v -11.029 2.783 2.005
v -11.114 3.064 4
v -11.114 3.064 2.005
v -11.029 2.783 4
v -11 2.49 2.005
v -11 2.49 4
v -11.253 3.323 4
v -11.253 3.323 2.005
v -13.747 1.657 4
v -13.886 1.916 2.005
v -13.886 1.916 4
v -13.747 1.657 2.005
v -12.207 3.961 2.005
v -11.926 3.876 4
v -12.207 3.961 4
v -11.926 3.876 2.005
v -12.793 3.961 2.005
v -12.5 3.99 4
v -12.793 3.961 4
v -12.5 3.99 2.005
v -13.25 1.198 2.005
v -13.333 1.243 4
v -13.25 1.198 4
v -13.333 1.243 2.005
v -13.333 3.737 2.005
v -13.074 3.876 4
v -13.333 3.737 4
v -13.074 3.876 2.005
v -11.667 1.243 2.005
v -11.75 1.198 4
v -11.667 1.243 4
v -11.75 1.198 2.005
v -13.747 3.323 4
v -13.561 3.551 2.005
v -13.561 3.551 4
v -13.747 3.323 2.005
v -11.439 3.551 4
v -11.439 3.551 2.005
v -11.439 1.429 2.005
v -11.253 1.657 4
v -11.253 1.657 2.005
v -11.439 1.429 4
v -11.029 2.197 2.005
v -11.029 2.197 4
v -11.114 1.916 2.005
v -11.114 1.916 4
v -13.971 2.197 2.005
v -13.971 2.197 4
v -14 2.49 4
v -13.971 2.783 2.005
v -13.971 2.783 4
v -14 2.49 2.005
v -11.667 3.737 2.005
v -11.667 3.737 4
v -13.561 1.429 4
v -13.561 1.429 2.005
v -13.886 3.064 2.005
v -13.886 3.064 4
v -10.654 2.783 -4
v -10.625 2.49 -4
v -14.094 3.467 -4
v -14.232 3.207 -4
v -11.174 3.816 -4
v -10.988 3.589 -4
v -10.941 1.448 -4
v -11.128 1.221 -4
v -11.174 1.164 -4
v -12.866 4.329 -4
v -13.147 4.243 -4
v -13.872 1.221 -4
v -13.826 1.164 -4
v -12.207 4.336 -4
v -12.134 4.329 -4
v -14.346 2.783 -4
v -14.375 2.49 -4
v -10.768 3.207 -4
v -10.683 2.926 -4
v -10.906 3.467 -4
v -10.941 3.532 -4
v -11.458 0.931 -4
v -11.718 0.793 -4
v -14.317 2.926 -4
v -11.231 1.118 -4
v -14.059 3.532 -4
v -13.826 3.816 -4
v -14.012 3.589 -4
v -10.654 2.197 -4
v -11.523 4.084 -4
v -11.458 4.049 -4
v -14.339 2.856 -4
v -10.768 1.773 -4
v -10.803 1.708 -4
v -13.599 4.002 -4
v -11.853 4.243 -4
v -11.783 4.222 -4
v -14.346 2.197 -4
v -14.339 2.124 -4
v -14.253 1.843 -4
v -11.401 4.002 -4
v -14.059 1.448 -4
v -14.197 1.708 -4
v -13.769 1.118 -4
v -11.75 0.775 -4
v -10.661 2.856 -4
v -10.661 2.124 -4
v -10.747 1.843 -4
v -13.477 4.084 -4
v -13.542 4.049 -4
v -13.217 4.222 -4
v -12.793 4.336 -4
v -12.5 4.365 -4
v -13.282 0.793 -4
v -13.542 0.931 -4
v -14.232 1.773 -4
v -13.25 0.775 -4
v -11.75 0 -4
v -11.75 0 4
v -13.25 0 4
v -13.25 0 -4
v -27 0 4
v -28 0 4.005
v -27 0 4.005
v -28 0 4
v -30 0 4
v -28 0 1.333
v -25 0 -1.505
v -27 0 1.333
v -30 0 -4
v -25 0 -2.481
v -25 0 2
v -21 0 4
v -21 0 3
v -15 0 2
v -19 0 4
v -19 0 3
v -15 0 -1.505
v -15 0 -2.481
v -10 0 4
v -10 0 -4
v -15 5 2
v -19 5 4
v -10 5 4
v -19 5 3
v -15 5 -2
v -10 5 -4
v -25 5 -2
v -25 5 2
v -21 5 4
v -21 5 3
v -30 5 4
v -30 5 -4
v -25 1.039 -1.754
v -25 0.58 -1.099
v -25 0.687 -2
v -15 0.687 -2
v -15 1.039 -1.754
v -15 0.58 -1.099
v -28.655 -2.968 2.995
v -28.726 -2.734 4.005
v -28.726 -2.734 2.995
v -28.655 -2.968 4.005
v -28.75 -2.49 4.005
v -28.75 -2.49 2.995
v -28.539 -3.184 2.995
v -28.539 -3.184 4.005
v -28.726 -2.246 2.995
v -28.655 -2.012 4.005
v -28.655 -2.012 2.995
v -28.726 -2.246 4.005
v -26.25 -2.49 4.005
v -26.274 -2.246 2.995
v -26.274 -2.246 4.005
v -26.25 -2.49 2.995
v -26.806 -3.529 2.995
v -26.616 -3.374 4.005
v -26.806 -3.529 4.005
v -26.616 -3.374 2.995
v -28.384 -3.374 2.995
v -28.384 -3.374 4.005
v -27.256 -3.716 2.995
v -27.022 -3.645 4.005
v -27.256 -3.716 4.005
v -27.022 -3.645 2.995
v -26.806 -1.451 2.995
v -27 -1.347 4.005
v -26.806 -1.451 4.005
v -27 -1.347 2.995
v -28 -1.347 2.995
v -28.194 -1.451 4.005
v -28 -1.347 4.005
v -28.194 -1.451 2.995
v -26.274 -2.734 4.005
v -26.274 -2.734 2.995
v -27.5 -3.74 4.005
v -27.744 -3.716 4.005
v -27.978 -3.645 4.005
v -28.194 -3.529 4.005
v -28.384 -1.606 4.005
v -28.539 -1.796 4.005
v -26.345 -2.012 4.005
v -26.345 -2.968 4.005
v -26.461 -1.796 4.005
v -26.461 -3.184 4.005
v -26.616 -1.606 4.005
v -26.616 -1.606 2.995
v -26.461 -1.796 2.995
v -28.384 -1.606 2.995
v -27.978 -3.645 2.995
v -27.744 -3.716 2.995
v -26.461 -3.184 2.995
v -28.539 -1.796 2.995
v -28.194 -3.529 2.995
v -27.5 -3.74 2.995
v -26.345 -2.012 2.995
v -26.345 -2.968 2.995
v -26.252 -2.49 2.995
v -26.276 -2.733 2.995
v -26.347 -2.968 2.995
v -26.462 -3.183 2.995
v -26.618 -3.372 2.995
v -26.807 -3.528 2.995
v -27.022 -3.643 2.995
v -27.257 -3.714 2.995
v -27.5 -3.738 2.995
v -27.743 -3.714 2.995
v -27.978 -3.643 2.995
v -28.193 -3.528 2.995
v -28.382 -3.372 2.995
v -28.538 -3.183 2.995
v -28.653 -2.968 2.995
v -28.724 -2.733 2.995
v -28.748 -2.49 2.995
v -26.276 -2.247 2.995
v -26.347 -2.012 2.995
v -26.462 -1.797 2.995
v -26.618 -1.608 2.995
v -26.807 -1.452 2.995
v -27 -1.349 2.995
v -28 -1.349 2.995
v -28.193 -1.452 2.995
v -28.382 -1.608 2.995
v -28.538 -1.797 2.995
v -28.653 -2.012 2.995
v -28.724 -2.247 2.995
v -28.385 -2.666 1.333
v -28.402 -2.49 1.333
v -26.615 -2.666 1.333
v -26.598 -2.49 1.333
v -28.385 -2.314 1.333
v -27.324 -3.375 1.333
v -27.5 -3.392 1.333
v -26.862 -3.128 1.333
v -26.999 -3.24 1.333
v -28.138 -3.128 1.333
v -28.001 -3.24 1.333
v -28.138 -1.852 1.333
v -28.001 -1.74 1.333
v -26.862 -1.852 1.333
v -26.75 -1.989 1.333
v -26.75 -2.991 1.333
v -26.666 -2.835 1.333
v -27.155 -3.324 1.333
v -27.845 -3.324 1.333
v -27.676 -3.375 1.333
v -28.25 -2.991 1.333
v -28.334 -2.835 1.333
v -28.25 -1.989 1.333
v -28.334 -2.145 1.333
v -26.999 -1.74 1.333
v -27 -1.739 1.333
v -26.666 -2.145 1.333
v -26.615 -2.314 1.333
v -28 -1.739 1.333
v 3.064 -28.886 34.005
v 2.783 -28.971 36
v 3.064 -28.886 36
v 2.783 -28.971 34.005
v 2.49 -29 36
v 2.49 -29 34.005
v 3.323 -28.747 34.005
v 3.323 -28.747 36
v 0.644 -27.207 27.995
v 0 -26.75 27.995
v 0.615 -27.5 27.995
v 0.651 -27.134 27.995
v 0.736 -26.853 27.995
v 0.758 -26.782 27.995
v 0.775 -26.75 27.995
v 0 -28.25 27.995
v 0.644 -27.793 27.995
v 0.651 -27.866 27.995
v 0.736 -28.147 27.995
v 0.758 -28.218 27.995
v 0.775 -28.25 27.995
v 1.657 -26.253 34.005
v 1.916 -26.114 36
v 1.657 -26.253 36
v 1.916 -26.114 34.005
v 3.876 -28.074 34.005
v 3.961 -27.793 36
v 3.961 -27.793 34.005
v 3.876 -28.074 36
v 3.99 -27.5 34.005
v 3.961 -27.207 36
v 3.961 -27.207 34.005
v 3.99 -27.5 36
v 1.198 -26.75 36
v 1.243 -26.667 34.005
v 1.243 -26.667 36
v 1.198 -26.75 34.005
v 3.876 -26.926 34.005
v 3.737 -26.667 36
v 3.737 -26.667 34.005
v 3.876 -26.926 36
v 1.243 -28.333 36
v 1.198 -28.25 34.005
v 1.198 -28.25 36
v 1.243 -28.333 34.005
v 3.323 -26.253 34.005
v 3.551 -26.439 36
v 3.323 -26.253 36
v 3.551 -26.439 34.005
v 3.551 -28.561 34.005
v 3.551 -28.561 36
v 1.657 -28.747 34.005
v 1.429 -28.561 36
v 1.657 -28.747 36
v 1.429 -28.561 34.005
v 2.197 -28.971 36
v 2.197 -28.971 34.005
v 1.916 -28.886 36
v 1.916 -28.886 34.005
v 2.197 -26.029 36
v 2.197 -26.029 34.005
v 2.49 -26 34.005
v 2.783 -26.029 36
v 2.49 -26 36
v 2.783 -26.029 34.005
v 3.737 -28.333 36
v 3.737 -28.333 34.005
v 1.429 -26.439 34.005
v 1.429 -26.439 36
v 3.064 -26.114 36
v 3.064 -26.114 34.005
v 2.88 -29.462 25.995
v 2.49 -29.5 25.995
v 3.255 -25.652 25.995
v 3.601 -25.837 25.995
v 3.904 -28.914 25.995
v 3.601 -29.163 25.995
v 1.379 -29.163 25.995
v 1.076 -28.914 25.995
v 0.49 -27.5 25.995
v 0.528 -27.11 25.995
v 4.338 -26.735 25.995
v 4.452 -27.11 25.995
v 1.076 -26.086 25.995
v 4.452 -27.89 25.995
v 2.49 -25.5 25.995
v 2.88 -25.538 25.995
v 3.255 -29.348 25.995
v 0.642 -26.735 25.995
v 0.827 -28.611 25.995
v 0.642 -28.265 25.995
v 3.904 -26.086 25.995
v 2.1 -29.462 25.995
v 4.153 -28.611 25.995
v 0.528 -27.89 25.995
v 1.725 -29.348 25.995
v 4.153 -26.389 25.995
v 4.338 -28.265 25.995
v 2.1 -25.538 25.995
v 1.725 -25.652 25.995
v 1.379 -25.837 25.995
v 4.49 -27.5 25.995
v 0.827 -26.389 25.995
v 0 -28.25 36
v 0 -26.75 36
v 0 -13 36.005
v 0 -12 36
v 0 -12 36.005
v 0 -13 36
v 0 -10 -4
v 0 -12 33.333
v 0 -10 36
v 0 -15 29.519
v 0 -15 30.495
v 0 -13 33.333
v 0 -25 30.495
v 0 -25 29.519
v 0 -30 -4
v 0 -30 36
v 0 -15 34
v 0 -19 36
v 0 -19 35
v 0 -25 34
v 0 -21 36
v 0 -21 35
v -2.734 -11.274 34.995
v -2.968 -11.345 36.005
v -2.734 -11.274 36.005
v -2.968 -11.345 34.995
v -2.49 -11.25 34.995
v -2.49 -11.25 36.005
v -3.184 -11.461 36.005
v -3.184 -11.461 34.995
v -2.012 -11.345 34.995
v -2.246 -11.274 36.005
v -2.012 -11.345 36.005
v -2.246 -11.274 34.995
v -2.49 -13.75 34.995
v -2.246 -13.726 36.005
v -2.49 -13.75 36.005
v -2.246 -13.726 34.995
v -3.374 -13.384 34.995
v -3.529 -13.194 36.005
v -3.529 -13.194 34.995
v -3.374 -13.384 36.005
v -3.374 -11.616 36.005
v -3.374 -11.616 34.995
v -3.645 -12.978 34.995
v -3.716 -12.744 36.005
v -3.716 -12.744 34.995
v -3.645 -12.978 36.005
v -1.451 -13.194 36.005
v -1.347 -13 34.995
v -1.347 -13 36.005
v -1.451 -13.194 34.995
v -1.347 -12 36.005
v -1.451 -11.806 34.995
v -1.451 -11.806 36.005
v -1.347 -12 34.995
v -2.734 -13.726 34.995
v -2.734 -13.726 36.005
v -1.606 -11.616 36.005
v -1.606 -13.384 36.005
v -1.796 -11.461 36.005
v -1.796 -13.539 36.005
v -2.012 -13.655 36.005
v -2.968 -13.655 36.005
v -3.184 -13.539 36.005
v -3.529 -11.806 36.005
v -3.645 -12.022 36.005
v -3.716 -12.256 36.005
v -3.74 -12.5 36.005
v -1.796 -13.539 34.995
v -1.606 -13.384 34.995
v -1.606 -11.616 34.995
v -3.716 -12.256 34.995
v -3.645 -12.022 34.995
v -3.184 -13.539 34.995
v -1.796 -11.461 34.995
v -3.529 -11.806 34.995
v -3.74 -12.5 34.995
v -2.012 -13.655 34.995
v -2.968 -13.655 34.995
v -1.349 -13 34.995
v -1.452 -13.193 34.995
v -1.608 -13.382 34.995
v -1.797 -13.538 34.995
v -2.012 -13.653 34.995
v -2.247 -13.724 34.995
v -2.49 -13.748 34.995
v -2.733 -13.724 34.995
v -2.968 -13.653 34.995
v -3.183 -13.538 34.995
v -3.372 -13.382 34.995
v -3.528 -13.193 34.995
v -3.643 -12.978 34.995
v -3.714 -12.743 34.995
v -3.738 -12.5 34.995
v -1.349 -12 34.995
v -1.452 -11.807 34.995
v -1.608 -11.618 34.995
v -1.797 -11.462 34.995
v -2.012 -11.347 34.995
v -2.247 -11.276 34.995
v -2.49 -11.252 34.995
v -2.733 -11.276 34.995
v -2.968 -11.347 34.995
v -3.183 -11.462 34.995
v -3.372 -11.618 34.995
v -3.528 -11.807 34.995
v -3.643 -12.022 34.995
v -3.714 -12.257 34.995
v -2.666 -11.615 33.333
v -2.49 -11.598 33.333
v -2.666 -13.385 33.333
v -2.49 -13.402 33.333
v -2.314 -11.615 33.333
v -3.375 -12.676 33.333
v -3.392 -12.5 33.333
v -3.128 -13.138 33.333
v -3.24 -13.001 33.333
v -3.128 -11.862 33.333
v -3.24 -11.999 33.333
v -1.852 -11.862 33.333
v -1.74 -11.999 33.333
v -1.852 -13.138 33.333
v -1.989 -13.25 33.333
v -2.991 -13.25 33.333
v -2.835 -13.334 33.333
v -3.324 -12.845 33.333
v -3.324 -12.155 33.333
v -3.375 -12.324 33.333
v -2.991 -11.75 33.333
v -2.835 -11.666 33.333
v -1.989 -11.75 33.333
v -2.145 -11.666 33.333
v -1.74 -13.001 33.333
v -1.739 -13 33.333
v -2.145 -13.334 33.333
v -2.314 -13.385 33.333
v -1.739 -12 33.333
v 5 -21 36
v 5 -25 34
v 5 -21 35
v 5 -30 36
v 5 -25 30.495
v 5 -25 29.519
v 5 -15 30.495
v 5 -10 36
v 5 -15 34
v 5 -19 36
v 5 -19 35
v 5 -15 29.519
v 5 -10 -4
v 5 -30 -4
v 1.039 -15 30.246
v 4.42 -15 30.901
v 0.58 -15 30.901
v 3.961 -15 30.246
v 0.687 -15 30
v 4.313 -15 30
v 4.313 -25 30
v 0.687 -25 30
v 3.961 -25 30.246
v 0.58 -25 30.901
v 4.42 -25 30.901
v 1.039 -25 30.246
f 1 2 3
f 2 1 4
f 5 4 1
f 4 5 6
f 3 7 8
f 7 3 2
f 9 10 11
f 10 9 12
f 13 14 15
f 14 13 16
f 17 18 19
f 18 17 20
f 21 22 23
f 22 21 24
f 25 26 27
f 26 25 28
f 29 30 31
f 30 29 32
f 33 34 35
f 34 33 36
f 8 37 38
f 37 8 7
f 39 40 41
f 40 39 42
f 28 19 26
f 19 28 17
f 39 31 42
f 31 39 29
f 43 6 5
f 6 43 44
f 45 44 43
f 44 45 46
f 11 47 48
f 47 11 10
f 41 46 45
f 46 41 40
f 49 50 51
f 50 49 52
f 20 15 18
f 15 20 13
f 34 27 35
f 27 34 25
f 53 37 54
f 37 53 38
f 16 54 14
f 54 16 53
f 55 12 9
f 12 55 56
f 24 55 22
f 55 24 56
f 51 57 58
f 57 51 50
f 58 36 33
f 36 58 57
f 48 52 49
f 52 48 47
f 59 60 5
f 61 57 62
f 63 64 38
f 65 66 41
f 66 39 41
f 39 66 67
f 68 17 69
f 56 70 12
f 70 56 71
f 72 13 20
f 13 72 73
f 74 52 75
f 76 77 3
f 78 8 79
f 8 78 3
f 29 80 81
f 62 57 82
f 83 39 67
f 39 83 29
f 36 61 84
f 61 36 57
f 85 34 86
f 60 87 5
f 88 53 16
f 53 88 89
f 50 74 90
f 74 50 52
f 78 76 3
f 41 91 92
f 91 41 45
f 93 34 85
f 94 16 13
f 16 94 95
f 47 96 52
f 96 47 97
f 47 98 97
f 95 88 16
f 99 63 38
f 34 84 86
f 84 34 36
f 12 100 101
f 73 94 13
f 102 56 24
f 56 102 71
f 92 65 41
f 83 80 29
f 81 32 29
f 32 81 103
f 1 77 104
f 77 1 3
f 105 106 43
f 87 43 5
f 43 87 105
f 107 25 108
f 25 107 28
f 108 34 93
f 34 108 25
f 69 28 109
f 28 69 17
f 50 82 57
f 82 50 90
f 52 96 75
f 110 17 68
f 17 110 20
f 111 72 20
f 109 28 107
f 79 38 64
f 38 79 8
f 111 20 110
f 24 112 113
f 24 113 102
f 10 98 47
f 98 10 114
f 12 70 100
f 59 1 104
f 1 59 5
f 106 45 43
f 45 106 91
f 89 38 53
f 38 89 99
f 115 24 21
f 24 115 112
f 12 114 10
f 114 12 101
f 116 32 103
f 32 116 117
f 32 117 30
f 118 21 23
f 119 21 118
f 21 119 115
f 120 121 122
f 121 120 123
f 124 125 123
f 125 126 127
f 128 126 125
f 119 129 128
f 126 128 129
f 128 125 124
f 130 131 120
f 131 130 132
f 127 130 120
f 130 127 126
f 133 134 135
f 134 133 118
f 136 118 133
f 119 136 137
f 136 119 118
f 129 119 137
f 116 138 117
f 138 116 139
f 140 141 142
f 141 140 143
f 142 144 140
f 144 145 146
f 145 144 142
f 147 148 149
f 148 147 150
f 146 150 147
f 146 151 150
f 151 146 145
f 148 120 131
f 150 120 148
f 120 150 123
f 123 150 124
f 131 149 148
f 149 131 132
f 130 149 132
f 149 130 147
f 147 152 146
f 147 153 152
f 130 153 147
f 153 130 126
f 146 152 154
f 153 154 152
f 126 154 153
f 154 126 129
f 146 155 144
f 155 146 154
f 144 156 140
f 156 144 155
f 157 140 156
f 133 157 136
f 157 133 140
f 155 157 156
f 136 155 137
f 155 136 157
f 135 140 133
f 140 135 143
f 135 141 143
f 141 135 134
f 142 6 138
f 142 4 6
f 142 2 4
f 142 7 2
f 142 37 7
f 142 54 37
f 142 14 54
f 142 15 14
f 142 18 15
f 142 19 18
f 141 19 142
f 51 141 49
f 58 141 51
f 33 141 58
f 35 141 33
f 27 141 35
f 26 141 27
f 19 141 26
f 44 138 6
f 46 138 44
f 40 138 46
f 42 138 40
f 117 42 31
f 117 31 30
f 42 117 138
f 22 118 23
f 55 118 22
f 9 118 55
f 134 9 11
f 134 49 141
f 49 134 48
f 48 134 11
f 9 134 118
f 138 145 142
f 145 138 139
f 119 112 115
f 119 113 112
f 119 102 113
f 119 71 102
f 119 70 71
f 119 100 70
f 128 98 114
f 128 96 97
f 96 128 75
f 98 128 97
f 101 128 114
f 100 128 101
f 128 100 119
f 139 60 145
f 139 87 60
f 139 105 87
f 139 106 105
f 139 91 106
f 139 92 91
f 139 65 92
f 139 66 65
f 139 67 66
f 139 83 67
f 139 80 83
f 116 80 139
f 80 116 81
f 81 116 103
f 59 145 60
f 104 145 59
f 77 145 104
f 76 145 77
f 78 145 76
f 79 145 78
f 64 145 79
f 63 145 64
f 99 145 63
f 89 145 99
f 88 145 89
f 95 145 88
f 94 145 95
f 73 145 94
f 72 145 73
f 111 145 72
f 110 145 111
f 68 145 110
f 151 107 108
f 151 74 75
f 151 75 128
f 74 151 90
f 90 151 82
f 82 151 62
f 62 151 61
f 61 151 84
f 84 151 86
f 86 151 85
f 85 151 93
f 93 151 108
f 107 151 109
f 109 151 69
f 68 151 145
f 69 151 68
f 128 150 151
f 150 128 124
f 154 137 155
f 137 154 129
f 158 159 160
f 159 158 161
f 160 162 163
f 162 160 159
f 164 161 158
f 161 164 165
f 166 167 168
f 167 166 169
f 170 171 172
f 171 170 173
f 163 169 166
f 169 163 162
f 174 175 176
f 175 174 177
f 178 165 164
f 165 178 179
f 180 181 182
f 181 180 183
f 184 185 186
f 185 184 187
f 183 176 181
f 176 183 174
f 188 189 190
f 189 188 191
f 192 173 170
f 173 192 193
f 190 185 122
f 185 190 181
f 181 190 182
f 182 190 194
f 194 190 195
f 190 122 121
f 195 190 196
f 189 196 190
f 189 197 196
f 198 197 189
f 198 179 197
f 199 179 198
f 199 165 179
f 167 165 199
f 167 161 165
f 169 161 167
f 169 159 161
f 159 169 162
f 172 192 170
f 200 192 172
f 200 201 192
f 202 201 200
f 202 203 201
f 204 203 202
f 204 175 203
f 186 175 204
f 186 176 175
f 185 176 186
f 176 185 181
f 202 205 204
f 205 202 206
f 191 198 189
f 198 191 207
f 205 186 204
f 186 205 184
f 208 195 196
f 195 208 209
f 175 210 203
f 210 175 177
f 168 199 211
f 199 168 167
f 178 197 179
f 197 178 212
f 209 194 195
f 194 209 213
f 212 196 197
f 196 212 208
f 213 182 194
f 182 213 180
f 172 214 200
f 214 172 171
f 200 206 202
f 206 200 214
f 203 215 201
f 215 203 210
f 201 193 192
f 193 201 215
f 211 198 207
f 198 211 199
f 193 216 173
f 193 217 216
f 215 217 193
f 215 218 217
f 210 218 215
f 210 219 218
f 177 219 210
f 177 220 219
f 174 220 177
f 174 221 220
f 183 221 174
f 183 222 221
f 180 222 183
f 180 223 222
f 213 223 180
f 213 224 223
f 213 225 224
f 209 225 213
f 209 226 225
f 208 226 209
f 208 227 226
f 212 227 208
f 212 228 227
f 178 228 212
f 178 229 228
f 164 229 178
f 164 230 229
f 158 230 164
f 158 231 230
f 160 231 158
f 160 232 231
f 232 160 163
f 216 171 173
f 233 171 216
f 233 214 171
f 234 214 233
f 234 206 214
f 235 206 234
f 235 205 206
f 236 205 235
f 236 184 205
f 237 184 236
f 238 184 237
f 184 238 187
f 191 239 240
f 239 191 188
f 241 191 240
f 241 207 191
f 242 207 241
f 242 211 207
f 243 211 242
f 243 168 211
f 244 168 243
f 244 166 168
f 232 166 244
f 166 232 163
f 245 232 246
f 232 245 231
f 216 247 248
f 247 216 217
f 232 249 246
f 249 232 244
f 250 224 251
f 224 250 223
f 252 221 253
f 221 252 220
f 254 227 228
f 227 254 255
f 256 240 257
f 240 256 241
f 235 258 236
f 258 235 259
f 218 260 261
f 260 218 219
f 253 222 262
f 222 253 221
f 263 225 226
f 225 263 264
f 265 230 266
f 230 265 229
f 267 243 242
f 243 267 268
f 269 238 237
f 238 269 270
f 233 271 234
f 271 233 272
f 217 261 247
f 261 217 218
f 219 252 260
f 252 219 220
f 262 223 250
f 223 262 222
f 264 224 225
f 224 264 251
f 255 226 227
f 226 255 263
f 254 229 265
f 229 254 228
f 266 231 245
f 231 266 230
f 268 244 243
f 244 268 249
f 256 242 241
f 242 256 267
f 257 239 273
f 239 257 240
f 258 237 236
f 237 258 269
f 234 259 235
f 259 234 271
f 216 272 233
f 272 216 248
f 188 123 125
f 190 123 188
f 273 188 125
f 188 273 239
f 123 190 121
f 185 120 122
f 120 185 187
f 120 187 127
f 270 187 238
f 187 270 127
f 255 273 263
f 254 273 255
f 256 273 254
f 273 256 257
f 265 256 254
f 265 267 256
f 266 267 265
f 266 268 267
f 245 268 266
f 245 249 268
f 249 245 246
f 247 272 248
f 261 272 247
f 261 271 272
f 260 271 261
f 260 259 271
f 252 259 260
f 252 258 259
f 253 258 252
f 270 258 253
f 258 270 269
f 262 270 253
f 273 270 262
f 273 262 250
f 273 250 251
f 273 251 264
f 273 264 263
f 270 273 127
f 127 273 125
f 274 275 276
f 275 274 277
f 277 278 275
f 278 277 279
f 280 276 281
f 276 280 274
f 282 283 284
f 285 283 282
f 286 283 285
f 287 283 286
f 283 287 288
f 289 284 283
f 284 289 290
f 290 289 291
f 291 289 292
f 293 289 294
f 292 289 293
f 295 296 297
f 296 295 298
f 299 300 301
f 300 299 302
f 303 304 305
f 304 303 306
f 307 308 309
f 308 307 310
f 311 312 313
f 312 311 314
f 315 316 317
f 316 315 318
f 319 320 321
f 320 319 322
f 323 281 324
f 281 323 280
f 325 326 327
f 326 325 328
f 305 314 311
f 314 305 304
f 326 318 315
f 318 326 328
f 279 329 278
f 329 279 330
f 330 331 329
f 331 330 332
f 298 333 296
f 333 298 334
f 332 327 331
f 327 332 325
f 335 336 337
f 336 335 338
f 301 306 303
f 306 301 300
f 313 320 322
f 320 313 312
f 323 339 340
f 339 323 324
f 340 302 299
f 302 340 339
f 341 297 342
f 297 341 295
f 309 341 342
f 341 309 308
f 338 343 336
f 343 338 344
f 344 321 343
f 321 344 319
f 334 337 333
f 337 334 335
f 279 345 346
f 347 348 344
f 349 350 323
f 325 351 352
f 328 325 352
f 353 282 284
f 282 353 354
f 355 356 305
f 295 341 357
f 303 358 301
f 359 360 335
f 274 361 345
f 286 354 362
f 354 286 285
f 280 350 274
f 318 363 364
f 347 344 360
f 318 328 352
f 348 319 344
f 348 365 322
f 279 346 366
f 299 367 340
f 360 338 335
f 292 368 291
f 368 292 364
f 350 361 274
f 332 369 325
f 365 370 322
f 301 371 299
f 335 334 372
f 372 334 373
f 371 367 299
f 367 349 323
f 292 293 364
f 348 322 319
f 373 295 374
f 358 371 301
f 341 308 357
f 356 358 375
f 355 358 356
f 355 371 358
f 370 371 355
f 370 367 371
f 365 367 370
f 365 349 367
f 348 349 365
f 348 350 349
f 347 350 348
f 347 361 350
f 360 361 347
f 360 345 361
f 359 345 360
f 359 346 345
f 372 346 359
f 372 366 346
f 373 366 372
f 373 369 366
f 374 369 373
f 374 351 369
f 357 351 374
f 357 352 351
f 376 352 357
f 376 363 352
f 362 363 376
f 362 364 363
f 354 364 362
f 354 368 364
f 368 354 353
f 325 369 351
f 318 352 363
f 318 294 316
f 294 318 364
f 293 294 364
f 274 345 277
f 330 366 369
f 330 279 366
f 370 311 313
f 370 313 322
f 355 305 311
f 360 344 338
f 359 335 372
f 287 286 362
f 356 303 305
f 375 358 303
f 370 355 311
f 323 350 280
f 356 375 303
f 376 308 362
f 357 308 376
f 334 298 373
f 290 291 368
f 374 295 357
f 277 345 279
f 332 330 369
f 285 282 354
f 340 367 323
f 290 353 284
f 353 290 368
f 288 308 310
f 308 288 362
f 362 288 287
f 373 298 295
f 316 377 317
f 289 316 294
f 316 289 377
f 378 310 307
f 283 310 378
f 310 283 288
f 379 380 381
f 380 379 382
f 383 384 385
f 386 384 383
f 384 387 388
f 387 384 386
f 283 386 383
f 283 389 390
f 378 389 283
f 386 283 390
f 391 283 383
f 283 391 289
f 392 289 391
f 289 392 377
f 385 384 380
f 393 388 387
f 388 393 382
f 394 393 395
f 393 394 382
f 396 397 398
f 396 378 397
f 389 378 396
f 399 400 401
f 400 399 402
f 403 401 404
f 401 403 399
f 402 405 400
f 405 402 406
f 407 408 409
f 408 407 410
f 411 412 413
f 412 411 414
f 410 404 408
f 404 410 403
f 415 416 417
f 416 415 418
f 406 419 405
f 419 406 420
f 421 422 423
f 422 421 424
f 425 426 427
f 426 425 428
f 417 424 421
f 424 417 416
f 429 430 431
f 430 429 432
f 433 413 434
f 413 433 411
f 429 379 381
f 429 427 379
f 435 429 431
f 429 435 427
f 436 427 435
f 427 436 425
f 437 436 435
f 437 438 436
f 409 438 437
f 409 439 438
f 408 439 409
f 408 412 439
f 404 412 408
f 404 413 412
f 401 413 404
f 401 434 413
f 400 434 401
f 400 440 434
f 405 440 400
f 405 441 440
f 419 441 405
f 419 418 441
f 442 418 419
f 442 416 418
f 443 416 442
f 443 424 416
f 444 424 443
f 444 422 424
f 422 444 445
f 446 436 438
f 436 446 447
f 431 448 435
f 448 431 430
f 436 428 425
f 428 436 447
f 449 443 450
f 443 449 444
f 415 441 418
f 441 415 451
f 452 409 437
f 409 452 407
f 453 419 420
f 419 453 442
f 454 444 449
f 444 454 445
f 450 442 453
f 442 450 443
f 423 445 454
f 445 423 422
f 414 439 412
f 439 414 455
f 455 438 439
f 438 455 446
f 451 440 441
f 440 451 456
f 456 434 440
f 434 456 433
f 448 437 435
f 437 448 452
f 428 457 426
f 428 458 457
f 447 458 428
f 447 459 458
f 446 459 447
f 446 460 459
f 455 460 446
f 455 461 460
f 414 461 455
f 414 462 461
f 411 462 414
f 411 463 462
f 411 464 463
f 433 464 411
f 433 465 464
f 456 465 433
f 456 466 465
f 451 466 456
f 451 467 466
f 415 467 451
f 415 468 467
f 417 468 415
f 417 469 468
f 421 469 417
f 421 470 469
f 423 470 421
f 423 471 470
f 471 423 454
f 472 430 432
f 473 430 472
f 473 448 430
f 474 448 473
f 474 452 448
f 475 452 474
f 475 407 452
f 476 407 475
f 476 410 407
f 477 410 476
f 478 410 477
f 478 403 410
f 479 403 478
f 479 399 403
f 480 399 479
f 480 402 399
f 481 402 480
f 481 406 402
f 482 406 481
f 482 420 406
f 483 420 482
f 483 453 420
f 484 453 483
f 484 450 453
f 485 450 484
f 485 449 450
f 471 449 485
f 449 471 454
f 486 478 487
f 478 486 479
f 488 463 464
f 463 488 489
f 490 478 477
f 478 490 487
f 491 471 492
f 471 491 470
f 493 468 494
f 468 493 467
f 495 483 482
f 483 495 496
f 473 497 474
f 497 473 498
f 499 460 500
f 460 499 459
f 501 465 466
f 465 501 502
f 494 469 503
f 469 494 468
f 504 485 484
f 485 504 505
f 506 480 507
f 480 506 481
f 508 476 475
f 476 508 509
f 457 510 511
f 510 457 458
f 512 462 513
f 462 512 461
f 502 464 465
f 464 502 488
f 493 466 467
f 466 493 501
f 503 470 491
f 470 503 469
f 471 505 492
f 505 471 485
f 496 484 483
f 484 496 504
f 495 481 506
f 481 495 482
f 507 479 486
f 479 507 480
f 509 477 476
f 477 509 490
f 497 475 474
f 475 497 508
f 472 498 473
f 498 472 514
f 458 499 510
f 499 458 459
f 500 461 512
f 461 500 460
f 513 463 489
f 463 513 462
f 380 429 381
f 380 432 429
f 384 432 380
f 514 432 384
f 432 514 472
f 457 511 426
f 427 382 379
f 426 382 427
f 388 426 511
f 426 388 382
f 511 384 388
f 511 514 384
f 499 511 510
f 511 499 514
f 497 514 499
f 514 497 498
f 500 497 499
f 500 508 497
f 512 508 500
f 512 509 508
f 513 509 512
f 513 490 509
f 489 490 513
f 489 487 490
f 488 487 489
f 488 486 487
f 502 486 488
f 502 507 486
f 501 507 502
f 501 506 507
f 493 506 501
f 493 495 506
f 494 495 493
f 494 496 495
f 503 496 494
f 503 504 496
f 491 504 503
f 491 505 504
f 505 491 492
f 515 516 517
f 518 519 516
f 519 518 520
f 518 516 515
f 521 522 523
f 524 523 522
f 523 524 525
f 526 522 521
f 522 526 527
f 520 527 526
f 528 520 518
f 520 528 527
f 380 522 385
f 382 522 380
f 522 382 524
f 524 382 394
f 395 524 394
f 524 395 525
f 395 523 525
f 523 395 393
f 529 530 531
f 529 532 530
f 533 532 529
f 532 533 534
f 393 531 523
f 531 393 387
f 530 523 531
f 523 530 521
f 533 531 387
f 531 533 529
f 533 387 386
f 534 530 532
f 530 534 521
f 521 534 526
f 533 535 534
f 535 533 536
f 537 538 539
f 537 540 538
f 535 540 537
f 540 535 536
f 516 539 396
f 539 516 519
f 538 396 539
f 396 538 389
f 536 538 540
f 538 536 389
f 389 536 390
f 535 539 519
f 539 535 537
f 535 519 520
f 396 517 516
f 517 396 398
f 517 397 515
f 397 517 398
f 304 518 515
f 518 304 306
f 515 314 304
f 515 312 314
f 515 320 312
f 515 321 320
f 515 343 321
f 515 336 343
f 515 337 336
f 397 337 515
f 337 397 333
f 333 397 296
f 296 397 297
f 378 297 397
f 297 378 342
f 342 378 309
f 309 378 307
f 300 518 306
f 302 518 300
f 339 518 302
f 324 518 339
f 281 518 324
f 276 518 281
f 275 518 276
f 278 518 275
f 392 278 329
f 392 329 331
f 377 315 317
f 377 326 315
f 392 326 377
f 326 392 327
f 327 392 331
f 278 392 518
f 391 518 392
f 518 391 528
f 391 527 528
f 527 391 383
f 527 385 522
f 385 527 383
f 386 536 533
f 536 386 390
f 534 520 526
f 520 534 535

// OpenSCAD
/*

  ttt_curve270m_ramp_3.scad

  (c) olikraus@gmail.com

  This work is licensed under the Creative Commons Attribution-NonCommercial-ShareAlike 4.0 International License. 
  To view a copy of this license, visit http://creativecommons.org/licenses/by-nc-sa/4.0/.

*/
include <train_tube_track.scad>;



ttt_curved270m_ramp_3();
